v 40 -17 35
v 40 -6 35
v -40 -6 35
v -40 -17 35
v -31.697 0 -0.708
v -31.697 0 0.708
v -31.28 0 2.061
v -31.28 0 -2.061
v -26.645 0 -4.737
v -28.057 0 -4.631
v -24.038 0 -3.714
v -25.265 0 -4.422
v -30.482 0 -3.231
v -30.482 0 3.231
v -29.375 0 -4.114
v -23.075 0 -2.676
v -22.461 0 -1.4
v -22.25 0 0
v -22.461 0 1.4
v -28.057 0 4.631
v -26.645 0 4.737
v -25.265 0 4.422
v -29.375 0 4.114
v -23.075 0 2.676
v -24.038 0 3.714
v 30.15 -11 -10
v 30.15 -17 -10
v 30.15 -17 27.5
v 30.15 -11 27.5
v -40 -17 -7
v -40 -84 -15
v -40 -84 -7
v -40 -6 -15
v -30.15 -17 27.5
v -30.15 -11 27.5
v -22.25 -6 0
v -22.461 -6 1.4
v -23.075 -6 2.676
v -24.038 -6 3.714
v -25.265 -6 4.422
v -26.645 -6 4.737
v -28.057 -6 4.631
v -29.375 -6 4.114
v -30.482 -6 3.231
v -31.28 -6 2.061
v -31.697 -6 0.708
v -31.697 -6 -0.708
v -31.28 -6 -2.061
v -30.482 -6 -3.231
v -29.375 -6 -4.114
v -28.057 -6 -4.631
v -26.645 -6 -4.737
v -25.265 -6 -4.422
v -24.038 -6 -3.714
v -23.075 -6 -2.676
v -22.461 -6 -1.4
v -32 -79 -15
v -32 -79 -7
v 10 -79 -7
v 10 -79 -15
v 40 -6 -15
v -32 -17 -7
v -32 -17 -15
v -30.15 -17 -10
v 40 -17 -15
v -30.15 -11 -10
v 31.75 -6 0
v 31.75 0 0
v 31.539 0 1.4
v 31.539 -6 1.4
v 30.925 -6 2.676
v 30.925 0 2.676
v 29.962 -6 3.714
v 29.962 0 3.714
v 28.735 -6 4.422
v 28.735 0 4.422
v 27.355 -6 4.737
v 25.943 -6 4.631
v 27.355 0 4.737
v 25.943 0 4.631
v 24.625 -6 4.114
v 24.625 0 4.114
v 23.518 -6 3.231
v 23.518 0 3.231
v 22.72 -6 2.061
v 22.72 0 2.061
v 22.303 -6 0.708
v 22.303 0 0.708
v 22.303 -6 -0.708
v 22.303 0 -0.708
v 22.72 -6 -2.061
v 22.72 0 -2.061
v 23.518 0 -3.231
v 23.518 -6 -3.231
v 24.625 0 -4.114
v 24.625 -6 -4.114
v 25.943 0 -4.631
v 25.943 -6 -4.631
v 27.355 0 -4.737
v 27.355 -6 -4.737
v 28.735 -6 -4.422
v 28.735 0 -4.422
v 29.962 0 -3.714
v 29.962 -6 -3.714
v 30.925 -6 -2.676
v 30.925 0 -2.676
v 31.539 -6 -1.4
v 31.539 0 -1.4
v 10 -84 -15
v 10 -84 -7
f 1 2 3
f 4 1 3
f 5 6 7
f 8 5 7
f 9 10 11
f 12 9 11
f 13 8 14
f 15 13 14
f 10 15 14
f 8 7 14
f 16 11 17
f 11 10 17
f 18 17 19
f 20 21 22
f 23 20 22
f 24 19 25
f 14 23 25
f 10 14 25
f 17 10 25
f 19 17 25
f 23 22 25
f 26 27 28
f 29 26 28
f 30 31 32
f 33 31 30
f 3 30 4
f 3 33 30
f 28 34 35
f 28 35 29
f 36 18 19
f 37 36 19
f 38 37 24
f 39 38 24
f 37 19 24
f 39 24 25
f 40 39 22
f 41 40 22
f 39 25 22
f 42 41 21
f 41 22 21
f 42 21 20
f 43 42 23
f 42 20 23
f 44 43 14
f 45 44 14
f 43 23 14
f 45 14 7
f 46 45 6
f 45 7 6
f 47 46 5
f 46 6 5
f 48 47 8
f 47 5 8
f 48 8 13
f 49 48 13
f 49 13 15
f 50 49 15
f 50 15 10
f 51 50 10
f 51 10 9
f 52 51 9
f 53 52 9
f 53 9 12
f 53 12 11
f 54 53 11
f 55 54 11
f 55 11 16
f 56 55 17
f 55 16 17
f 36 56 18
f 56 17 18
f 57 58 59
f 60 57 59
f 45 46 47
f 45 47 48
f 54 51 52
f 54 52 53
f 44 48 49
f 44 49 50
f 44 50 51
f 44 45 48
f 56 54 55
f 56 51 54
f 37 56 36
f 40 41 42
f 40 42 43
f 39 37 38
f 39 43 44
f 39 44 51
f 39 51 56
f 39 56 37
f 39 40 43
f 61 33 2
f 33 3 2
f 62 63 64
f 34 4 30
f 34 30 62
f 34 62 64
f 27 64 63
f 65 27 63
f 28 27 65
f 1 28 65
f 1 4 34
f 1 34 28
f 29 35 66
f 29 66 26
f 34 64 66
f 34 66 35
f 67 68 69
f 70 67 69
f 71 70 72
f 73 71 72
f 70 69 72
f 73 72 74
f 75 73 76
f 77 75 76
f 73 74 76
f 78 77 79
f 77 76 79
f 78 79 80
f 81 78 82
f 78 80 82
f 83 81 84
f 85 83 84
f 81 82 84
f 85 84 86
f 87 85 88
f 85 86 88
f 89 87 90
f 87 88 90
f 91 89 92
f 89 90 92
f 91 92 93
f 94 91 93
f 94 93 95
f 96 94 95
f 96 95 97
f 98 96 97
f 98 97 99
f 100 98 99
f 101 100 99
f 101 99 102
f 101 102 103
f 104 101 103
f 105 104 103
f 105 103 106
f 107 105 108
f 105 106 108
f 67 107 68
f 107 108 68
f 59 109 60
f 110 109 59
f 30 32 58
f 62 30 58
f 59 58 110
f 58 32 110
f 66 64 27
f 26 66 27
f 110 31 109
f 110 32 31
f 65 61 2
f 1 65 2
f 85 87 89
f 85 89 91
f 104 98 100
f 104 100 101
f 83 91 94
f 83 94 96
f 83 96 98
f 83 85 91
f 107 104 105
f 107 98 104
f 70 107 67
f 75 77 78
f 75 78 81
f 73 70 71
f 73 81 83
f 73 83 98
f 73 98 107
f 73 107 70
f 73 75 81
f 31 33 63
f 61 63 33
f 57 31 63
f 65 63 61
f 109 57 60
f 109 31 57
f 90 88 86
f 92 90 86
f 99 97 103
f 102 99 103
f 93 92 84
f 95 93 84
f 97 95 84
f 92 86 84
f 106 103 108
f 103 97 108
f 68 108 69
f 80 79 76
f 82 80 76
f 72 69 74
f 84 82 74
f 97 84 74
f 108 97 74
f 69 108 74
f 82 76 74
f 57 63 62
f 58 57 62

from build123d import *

# Parameters (mm, degrees)
F0_R     = 4.75
F1_DEPTH = 6
F2_R     = 4.75
F3_DEPTH = 11
F4_W     = 60.3
F4_H     = 37.5
F5_DEPTH = 6
F6_W     = 8
F6_H     = 8
F7_DEPTH = 67
F8_W     = 42
F8_H     = 8
F9_DEPTH = 5


with BuildPart() as f1:
    # F0 (on Front) → F1 (new body)
    with BuildSketch(Plane.XZ):
        with Locations((-27, 0)):
            Circle(F0_R)
    extrude(amount=F1_DEPTH)


with BuildPart() as f1b:
    # F0 (on Front) → F1, piece 2 (new body)
    with BuildSketch(Plane.XZ):
        with Locations((27, 0)):
            Circle(F0_R)
    extrude(amount=F1_DEPTH)


with BuildPart() as f3:
    # F2 (on face) → F3 (new body)
    with BuildSketch(Plane.XZ.offset(6)):
        Polygon((-40, -15), (40, -15), (40, 15), (40, 35), (-40, 35), (-40, 15), align=None)
        with Locations((-27, 0)):
            Circle(F2_R, mode=Mode.SUBTRACT)
        with Locations((-27, 0)):
            Circle(F2_R)
    extrude(amount=F3_DEPTH)

    # F4 (on face) → F5 (cut)
    with BuildSketch(Plane.XZ.offset(17)):
        with Locations((0, 8.75)):
            Rectangle(F4_W, F4_H)
    extrude(amount=-F5_DEPTH, mode=Mode.SUBTRACT)

    # F6 (on face) → F7 (join)
    with BuildSketch(Plane.XZ.offset(17)):
        with Locations((-36, -11)):
            Rectangle(F6_W, F6_H)
    extrude(amount=F7_DEPTH)

    # F8 (on face) → F9 (join)
    with BuildSketch(Plane.XZ.offset(84)):
        with Locations((-11, -11)):
            Rectangle(F8_W, F8_H)
    extrude(amount=-F9_DEPTH)


solid = Compound([f1.part, f1b.part, f3.part])
